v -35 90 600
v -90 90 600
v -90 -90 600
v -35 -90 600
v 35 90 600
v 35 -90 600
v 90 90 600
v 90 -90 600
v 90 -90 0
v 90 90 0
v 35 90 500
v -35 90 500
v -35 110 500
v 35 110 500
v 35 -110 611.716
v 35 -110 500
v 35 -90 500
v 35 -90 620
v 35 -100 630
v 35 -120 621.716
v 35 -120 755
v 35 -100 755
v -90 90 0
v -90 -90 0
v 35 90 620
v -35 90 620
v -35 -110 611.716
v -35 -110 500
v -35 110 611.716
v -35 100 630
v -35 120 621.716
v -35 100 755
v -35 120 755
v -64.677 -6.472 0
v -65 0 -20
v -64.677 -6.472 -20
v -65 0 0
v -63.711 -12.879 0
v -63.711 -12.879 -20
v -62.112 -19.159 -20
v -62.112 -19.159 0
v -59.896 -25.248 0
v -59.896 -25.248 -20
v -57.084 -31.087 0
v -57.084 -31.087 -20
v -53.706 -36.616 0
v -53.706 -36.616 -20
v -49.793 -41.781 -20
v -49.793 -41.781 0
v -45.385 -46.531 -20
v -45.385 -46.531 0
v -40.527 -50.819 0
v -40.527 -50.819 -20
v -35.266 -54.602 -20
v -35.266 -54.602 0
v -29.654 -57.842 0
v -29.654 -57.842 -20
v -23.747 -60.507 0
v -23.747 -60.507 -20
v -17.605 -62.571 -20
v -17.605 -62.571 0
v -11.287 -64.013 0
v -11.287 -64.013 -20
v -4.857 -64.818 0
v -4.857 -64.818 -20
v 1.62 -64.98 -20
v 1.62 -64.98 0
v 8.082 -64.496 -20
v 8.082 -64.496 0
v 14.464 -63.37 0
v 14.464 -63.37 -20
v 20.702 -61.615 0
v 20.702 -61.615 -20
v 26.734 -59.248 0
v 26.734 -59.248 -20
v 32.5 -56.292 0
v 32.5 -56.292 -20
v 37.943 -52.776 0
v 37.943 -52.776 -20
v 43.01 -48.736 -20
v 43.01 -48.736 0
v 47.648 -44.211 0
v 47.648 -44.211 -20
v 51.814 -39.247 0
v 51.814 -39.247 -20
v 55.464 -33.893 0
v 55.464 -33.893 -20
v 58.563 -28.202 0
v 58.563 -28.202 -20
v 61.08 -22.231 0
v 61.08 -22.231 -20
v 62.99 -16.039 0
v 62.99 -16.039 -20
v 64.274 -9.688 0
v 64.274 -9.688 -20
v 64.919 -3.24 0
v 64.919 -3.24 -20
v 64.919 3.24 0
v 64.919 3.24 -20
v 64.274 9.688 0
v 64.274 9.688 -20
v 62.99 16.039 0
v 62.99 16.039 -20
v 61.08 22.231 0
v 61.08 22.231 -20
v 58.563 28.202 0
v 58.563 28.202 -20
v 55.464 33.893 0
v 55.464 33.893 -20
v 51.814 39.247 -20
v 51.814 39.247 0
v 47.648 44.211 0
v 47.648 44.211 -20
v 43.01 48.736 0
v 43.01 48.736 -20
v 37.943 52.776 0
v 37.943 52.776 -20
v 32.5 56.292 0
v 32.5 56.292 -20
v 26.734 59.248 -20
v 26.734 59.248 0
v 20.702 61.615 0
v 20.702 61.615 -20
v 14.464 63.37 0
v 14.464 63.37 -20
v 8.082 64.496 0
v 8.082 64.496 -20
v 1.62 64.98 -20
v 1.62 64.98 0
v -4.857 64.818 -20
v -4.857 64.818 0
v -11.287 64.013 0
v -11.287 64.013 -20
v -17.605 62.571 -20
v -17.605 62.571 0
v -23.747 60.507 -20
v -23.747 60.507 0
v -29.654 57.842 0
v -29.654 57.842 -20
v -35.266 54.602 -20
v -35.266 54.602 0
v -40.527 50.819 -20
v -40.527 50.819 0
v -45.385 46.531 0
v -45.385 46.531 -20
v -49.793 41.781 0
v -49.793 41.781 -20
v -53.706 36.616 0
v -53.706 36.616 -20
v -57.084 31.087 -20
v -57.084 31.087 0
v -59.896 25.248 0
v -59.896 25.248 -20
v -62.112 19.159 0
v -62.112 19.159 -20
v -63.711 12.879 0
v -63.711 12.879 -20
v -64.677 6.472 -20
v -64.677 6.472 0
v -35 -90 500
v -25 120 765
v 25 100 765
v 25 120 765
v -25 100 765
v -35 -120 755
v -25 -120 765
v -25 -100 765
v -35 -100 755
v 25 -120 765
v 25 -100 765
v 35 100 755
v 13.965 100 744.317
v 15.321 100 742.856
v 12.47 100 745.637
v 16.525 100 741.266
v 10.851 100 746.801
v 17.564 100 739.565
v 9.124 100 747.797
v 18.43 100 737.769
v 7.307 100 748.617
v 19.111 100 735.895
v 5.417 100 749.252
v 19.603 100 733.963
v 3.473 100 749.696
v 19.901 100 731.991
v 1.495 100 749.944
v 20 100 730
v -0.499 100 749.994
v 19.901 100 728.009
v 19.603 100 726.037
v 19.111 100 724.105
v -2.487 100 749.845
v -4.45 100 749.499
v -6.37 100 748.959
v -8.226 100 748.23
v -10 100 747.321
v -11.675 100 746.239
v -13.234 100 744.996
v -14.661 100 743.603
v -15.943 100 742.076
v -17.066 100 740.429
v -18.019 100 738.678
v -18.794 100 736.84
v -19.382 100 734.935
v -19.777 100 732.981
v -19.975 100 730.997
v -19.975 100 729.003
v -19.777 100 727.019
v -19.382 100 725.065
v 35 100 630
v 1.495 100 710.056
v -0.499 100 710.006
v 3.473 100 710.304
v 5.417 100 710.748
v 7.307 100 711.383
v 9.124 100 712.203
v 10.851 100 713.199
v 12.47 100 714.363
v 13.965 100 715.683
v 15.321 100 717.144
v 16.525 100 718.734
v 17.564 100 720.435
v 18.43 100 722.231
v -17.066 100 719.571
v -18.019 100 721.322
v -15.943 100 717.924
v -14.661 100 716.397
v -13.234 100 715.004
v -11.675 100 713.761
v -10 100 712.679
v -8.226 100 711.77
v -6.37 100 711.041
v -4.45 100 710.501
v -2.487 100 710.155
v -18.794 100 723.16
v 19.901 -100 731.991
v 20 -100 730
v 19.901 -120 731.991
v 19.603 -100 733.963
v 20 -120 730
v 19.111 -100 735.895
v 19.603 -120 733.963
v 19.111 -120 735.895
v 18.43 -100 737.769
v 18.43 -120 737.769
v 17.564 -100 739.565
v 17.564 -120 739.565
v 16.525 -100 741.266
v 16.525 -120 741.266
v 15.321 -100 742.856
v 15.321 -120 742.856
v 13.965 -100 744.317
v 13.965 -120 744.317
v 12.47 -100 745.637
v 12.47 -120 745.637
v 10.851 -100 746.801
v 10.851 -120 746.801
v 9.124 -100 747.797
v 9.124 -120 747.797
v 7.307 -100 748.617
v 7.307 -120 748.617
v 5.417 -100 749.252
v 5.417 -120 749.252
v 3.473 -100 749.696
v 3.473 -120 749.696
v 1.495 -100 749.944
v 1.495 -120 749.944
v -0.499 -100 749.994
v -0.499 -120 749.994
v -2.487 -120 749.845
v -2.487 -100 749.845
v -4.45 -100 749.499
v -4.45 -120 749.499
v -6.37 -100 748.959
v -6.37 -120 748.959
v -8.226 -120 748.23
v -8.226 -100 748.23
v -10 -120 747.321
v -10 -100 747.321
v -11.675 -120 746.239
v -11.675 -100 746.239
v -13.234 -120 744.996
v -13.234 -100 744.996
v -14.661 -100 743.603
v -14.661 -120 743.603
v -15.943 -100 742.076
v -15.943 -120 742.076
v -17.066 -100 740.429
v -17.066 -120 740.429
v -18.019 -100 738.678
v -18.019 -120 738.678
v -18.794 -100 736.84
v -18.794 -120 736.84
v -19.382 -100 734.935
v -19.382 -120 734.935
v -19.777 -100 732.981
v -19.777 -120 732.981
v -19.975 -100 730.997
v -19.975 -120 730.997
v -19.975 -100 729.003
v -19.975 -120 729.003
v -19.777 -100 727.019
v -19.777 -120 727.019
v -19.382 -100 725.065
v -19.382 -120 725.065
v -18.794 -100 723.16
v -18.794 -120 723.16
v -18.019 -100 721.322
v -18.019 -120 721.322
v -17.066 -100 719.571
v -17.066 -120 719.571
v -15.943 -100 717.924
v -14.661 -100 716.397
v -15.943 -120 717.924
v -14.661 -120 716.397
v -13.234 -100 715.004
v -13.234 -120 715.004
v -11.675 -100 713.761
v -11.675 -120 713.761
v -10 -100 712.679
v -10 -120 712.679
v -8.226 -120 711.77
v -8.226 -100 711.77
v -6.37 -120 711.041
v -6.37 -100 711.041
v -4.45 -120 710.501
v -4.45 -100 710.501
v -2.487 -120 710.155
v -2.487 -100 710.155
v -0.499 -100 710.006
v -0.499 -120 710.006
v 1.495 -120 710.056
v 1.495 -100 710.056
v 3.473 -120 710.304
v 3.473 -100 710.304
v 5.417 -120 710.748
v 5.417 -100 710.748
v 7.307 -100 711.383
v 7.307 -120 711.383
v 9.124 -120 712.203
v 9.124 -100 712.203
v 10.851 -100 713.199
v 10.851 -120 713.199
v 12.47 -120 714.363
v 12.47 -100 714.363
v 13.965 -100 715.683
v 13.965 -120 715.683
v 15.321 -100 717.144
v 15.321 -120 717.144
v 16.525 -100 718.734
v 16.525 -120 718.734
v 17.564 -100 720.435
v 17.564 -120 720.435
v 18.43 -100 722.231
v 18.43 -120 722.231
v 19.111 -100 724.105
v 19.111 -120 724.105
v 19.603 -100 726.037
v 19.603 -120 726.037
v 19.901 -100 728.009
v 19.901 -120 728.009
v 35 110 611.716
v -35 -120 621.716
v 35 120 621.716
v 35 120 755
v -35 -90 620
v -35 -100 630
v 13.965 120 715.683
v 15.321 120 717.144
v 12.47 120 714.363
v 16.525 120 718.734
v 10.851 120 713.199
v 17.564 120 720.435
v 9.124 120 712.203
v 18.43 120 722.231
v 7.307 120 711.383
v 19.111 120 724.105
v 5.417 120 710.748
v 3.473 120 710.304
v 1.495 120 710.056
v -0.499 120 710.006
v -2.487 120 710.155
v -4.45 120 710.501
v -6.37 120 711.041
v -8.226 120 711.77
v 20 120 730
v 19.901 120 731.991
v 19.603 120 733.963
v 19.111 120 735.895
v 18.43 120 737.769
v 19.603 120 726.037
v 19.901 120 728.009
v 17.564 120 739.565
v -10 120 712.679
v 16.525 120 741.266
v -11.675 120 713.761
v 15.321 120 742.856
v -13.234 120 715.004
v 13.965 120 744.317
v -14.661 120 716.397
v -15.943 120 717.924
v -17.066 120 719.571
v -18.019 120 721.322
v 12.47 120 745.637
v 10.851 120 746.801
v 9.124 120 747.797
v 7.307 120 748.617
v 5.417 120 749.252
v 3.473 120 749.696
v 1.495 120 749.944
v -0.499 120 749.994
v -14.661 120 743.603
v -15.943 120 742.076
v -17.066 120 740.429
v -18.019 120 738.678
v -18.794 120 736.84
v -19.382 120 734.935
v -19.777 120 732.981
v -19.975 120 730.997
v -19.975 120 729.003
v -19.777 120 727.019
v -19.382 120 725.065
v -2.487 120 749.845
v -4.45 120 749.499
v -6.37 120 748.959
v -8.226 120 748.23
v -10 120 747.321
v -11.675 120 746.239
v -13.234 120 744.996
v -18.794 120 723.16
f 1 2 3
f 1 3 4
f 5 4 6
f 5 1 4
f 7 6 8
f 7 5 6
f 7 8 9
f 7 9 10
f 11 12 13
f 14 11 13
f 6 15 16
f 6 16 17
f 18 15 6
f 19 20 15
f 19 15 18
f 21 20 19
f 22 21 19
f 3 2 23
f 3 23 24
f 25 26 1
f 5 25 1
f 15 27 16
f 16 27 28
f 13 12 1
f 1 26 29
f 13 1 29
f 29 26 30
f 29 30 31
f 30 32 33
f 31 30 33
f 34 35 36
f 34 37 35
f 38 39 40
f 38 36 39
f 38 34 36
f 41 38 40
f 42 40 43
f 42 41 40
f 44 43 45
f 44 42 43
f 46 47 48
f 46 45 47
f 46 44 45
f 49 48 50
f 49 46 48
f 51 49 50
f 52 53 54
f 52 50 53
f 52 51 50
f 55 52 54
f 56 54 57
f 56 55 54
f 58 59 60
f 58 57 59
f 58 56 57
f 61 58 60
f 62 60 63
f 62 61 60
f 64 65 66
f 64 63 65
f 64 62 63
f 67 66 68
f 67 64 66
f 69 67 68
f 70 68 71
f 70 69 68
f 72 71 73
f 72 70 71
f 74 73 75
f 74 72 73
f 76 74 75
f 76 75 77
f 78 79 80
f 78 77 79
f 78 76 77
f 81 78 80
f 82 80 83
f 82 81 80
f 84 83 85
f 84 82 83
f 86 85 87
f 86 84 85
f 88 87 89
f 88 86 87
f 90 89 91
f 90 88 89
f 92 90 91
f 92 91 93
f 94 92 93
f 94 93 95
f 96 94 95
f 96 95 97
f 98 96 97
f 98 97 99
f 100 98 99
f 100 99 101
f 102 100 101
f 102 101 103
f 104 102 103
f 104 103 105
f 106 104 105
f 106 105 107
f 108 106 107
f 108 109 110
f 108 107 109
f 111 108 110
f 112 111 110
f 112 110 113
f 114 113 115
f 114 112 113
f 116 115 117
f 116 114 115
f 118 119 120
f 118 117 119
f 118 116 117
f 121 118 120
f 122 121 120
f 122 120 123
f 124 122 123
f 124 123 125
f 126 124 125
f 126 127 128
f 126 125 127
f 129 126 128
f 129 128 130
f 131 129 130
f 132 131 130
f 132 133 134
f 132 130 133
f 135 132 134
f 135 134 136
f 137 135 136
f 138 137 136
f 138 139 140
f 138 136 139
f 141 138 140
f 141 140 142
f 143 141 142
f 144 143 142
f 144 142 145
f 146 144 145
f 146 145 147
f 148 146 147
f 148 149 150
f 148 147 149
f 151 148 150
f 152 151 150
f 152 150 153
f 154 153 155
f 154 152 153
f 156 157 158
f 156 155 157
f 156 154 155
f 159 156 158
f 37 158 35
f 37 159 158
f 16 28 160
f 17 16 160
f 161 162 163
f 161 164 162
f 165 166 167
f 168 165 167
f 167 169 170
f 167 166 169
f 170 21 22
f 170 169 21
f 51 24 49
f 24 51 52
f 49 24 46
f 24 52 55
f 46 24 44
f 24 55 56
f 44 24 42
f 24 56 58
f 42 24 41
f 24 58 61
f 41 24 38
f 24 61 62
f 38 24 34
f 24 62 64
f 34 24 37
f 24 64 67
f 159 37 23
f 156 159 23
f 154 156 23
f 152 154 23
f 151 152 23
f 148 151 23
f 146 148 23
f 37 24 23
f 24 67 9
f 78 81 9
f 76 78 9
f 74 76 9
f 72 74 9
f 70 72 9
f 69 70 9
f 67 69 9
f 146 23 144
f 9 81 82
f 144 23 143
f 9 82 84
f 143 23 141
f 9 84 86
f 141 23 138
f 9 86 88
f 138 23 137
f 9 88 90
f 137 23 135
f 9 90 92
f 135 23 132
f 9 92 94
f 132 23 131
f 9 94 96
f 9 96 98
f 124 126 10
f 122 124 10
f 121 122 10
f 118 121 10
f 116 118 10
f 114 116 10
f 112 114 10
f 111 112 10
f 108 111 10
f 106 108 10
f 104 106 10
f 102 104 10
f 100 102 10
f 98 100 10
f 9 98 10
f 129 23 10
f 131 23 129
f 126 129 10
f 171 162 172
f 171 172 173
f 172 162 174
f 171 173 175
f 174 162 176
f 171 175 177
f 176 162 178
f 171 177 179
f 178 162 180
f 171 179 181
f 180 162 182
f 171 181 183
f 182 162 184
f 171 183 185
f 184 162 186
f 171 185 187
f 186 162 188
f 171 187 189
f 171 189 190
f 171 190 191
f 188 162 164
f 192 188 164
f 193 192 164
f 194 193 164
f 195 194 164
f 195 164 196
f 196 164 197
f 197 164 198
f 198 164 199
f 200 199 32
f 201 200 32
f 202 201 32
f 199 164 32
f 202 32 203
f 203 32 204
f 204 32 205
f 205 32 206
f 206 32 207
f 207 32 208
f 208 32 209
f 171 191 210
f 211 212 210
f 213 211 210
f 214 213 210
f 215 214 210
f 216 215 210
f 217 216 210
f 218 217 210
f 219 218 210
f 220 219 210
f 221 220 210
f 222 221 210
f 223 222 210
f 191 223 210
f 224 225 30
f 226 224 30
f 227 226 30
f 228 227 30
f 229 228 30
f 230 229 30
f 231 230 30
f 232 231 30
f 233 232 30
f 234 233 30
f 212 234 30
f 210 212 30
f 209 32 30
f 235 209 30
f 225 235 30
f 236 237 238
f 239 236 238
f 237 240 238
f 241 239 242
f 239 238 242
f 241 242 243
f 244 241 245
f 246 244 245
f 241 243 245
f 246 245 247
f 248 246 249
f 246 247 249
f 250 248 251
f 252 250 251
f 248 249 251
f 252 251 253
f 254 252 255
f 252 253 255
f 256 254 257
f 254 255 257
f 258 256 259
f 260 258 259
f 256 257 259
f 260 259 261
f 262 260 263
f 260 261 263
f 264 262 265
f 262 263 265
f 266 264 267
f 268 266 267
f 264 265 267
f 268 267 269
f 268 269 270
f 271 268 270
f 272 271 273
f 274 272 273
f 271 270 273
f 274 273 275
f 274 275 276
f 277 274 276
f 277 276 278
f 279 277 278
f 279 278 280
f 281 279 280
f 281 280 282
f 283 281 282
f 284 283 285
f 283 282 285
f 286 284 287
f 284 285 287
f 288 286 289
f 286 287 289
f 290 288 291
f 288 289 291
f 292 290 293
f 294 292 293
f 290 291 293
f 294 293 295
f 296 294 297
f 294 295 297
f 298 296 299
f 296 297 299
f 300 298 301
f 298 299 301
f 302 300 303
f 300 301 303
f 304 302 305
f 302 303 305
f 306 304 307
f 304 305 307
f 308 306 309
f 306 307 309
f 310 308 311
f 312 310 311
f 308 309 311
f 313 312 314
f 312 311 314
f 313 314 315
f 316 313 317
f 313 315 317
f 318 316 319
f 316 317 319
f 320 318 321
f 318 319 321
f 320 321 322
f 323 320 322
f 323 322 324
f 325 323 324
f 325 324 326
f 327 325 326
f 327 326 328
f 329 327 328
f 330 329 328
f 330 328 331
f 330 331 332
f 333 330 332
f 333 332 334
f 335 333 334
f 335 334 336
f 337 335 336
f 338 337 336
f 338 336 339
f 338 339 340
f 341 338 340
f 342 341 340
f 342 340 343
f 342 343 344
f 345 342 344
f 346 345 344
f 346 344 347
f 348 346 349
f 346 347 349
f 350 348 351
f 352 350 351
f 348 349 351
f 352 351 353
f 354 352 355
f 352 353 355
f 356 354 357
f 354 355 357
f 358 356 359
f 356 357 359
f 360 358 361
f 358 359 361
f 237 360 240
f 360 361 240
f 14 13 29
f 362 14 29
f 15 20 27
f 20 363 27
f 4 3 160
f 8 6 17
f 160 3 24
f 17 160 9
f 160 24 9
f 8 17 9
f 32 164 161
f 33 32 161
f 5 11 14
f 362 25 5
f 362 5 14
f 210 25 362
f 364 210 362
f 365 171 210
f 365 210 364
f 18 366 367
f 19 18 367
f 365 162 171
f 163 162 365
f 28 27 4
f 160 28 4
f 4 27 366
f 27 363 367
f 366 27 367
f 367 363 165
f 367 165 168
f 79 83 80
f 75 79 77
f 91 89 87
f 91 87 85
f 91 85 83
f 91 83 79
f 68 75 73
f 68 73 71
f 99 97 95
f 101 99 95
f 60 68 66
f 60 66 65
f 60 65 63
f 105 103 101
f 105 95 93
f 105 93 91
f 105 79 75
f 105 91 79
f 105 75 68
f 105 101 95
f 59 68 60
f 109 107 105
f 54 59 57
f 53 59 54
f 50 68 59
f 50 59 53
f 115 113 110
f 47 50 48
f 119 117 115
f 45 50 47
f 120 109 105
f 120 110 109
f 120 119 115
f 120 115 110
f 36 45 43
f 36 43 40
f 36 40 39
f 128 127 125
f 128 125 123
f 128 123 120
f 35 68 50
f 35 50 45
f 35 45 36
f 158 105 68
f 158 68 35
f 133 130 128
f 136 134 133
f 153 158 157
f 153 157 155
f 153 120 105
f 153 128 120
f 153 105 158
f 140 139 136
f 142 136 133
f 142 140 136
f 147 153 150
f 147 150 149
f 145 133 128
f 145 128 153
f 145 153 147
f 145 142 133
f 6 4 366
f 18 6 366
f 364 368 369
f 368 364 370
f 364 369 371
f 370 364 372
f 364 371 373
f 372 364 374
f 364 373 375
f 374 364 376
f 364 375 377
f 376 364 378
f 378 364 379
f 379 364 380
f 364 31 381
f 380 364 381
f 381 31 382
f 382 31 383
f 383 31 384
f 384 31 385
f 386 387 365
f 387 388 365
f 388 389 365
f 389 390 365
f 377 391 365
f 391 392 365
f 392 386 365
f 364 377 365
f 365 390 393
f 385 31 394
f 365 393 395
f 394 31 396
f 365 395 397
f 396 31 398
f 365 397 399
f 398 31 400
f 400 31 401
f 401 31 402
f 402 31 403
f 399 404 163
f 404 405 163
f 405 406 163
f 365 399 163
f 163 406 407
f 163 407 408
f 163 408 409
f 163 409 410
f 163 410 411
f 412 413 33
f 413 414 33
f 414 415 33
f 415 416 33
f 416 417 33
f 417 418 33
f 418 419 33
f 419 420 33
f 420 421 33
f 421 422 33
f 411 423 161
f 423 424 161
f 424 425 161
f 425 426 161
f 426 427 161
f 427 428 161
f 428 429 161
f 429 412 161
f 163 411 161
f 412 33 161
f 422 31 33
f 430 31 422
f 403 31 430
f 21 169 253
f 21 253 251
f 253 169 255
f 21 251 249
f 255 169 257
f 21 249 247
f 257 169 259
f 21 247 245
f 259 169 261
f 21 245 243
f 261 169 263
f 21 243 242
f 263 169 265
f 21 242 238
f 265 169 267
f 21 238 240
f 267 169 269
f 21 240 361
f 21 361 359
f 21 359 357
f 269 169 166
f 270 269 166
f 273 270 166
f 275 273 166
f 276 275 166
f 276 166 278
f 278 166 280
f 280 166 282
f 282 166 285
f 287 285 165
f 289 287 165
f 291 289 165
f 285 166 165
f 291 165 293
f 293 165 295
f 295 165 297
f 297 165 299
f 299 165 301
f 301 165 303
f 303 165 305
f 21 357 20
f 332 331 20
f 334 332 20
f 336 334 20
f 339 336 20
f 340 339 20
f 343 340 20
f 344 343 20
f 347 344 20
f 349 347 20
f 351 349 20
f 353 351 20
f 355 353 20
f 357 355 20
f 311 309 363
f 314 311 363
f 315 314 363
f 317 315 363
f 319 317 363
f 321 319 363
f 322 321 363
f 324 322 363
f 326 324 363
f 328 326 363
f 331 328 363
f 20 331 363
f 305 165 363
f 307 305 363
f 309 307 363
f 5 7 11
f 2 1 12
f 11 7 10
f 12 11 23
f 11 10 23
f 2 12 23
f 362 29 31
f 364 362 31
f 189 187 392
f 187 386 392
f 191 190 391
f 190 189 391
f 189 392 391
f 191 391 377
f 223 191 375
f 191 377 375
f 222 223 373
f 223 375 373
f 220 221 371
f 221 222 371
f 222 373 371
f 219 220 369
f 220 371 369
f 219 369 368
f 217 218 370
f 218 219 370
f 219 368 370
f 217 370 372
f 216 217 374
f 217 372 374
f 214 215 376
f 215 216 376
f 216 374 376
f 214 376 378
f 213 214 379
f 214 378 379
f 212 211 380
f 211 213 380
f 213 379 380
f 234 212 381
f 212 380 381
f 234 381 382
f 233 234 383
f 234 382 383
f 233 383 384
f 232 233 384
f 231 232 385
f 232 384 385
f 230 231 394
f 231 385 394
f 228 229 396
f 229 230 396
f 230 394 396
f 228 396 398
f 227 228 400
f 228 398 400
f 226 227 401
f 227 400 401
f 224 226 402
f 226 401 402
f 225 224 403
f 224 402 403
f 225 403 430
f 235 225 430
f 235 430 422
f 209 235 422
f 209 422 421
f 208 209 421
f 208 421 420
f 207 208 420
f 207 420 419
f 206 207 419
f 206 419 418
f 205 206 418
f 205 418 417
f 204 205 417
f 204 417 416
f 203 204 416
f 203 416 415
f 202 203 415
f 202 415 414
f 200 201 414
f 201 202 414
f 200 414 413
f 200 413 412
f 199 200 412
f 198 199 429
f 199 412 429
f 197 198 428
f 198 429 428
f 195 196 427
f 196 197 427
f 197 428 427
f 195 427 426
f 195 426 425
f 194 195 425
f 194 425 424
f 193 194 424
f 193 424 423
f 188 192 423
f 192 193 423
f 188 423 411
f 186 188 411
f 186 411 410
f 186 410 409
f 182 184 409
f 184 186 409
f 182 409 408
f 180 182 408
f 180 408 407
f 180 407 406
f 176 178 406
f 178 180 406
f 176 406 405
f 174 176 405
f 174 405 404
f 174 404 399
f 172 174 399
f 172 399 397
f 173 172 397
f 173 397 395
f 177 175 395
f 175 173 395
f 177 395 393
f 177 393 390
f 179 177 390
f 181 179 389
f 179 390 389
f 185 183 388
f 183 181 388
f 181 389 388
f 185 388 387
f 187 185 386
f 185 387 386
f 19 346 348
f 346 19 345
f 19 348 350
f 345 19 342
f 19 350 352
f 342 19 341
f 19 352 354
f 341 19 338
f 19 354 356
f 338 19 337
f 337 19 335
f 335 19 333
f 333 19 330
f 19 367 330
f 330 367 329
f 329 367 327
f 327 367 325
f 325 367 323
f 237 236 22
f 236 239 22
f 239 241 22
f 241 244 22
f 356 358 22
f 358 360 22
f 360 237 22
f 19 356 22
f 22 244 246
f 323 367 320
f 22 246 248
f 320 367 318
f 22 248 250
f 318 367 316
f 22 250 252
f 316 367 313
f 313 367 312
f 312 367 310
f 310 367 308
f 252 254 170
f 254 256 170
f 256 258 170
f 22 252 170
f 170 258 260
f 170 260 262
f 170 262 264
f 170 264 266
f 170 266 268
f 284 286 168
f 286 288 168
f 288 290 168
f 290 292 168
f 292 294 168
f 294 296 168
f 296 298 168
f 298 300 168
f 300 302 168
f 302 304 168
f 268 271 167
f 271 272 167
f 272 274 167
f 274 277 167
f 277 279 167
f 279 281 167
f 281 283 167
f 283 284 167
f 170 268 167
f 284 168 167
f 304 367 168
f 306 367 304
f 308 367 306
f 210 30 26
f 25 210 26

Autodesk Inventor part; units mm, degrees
ref_plane "YZ Plane" through (0, 0, 0) normal (1, 0, 0) x (0, 1, 0)
ref_plane "XZ Plane" through (0, 0, 0) normal (0, 1, 0) x (-1, 0, 0)
ref_plane "XY Plane" through (0, 0, 0) normal (0, 0, 1) x (1, 0, 0)
sketch "Náčrt1" plane through (0, 0, 0) normal (0, 0, 1) x (1, 0, 0)
  line L0 (-90, -90) -> (90, -90)
  line L1 (90, -90) -> (90, 90)
  line L2 (90, 90) -> (-90, 90)
  line L3 (-90, 90) -> (-90, -90)
  line L4 (-90, -90) -> (90, 90) construction
  line L5 (90, -90) -> (-90, 90) construction
  point P0 (0, 0)
  dimension "d0" = 180
extrude "Vysunutí1" add sketch "Náčrt1" along normal blind 600
sketch "Náčrt2" plane through (0, 0, 0) normal (1, 0, 0) x (0, 1, 0)
  line L0 (-90, 0) -> (-90, 600) projected
  line L1 (-100, 630) -> (-100, 765)
  line L2 (-120, 681.7157) -> (-120, 540)
  line L3 (-90, 600) -> (90, 600) projected
  line L4 (0, 600) -> (0, 773.8359) construction
  line L5 (-90, 0) -> (90, 0) projected
  line L6 (-90, 500) -> (-90, 620)
  line L7 (-90, 620) -> (-100, 630)
  line L8 (-120, 765) -> (-120, 621.7157)
  line L9 (-120, 621.7157) -> (-110, 611.7157)
  line L10 (-110, 611.7157) -> (-110, 500)
  line L11 (-120, 765) -> (-100, 765)
  line L12 (-110, 500) -> (-90, 500)
  line L13 (-120, 730) -> (-100, 730) construction
  point P0 (0, 0)
  dimension "d5" = 100
  dimension "d22" = 135
  dimension "d24" = 20
  dimension "d26" = 20
  dimension "d35" = 35
  dimension "d36" = 130
  dimension "d37" = 100
extrude "Vysunutí2" add sketch "Náčrt2" along normal mid plane 70
sketch "Náčrt3" plane through (-30, -120, 582.0978) normal (0, -1, 0) x (1, 0, 0)
  line L0 (-5, 182.9022) -> (65, 182.9022) projected
  line L1 (30, 182.9022) -> (30, 119.5637) construction
  circle A0 centre (30, 147.9022) radius 20
  point P0 (30, -582.0978)
  dimension "d11" = 40
  dimension "d12" = 35
  dimension "d25" = 70
extrude "Vysunutí3" cut sketch "Náčrt3" against normal blind 60
chamfer "Zkosení1" distance 10 angle 45 2 edges at (35, -110, 765) (-35, -110, 765)
mirror "Zrcadlit1" about plane through (0, 0, 0) normal (0, 1, 0)
sketch "Náčrt5" plane through (0, 0, 0) normal (0, 0, -1) x (-1, 0, 0)
  circle A0 centre (0, 0) radius 65
  dimension "d40" = 130
extrude "Vysunutí5" add sketch "Náčrt5" along normal blind 20
equation "\"d12\" = 0.5 * d25"
properties part number "B6-A2"
